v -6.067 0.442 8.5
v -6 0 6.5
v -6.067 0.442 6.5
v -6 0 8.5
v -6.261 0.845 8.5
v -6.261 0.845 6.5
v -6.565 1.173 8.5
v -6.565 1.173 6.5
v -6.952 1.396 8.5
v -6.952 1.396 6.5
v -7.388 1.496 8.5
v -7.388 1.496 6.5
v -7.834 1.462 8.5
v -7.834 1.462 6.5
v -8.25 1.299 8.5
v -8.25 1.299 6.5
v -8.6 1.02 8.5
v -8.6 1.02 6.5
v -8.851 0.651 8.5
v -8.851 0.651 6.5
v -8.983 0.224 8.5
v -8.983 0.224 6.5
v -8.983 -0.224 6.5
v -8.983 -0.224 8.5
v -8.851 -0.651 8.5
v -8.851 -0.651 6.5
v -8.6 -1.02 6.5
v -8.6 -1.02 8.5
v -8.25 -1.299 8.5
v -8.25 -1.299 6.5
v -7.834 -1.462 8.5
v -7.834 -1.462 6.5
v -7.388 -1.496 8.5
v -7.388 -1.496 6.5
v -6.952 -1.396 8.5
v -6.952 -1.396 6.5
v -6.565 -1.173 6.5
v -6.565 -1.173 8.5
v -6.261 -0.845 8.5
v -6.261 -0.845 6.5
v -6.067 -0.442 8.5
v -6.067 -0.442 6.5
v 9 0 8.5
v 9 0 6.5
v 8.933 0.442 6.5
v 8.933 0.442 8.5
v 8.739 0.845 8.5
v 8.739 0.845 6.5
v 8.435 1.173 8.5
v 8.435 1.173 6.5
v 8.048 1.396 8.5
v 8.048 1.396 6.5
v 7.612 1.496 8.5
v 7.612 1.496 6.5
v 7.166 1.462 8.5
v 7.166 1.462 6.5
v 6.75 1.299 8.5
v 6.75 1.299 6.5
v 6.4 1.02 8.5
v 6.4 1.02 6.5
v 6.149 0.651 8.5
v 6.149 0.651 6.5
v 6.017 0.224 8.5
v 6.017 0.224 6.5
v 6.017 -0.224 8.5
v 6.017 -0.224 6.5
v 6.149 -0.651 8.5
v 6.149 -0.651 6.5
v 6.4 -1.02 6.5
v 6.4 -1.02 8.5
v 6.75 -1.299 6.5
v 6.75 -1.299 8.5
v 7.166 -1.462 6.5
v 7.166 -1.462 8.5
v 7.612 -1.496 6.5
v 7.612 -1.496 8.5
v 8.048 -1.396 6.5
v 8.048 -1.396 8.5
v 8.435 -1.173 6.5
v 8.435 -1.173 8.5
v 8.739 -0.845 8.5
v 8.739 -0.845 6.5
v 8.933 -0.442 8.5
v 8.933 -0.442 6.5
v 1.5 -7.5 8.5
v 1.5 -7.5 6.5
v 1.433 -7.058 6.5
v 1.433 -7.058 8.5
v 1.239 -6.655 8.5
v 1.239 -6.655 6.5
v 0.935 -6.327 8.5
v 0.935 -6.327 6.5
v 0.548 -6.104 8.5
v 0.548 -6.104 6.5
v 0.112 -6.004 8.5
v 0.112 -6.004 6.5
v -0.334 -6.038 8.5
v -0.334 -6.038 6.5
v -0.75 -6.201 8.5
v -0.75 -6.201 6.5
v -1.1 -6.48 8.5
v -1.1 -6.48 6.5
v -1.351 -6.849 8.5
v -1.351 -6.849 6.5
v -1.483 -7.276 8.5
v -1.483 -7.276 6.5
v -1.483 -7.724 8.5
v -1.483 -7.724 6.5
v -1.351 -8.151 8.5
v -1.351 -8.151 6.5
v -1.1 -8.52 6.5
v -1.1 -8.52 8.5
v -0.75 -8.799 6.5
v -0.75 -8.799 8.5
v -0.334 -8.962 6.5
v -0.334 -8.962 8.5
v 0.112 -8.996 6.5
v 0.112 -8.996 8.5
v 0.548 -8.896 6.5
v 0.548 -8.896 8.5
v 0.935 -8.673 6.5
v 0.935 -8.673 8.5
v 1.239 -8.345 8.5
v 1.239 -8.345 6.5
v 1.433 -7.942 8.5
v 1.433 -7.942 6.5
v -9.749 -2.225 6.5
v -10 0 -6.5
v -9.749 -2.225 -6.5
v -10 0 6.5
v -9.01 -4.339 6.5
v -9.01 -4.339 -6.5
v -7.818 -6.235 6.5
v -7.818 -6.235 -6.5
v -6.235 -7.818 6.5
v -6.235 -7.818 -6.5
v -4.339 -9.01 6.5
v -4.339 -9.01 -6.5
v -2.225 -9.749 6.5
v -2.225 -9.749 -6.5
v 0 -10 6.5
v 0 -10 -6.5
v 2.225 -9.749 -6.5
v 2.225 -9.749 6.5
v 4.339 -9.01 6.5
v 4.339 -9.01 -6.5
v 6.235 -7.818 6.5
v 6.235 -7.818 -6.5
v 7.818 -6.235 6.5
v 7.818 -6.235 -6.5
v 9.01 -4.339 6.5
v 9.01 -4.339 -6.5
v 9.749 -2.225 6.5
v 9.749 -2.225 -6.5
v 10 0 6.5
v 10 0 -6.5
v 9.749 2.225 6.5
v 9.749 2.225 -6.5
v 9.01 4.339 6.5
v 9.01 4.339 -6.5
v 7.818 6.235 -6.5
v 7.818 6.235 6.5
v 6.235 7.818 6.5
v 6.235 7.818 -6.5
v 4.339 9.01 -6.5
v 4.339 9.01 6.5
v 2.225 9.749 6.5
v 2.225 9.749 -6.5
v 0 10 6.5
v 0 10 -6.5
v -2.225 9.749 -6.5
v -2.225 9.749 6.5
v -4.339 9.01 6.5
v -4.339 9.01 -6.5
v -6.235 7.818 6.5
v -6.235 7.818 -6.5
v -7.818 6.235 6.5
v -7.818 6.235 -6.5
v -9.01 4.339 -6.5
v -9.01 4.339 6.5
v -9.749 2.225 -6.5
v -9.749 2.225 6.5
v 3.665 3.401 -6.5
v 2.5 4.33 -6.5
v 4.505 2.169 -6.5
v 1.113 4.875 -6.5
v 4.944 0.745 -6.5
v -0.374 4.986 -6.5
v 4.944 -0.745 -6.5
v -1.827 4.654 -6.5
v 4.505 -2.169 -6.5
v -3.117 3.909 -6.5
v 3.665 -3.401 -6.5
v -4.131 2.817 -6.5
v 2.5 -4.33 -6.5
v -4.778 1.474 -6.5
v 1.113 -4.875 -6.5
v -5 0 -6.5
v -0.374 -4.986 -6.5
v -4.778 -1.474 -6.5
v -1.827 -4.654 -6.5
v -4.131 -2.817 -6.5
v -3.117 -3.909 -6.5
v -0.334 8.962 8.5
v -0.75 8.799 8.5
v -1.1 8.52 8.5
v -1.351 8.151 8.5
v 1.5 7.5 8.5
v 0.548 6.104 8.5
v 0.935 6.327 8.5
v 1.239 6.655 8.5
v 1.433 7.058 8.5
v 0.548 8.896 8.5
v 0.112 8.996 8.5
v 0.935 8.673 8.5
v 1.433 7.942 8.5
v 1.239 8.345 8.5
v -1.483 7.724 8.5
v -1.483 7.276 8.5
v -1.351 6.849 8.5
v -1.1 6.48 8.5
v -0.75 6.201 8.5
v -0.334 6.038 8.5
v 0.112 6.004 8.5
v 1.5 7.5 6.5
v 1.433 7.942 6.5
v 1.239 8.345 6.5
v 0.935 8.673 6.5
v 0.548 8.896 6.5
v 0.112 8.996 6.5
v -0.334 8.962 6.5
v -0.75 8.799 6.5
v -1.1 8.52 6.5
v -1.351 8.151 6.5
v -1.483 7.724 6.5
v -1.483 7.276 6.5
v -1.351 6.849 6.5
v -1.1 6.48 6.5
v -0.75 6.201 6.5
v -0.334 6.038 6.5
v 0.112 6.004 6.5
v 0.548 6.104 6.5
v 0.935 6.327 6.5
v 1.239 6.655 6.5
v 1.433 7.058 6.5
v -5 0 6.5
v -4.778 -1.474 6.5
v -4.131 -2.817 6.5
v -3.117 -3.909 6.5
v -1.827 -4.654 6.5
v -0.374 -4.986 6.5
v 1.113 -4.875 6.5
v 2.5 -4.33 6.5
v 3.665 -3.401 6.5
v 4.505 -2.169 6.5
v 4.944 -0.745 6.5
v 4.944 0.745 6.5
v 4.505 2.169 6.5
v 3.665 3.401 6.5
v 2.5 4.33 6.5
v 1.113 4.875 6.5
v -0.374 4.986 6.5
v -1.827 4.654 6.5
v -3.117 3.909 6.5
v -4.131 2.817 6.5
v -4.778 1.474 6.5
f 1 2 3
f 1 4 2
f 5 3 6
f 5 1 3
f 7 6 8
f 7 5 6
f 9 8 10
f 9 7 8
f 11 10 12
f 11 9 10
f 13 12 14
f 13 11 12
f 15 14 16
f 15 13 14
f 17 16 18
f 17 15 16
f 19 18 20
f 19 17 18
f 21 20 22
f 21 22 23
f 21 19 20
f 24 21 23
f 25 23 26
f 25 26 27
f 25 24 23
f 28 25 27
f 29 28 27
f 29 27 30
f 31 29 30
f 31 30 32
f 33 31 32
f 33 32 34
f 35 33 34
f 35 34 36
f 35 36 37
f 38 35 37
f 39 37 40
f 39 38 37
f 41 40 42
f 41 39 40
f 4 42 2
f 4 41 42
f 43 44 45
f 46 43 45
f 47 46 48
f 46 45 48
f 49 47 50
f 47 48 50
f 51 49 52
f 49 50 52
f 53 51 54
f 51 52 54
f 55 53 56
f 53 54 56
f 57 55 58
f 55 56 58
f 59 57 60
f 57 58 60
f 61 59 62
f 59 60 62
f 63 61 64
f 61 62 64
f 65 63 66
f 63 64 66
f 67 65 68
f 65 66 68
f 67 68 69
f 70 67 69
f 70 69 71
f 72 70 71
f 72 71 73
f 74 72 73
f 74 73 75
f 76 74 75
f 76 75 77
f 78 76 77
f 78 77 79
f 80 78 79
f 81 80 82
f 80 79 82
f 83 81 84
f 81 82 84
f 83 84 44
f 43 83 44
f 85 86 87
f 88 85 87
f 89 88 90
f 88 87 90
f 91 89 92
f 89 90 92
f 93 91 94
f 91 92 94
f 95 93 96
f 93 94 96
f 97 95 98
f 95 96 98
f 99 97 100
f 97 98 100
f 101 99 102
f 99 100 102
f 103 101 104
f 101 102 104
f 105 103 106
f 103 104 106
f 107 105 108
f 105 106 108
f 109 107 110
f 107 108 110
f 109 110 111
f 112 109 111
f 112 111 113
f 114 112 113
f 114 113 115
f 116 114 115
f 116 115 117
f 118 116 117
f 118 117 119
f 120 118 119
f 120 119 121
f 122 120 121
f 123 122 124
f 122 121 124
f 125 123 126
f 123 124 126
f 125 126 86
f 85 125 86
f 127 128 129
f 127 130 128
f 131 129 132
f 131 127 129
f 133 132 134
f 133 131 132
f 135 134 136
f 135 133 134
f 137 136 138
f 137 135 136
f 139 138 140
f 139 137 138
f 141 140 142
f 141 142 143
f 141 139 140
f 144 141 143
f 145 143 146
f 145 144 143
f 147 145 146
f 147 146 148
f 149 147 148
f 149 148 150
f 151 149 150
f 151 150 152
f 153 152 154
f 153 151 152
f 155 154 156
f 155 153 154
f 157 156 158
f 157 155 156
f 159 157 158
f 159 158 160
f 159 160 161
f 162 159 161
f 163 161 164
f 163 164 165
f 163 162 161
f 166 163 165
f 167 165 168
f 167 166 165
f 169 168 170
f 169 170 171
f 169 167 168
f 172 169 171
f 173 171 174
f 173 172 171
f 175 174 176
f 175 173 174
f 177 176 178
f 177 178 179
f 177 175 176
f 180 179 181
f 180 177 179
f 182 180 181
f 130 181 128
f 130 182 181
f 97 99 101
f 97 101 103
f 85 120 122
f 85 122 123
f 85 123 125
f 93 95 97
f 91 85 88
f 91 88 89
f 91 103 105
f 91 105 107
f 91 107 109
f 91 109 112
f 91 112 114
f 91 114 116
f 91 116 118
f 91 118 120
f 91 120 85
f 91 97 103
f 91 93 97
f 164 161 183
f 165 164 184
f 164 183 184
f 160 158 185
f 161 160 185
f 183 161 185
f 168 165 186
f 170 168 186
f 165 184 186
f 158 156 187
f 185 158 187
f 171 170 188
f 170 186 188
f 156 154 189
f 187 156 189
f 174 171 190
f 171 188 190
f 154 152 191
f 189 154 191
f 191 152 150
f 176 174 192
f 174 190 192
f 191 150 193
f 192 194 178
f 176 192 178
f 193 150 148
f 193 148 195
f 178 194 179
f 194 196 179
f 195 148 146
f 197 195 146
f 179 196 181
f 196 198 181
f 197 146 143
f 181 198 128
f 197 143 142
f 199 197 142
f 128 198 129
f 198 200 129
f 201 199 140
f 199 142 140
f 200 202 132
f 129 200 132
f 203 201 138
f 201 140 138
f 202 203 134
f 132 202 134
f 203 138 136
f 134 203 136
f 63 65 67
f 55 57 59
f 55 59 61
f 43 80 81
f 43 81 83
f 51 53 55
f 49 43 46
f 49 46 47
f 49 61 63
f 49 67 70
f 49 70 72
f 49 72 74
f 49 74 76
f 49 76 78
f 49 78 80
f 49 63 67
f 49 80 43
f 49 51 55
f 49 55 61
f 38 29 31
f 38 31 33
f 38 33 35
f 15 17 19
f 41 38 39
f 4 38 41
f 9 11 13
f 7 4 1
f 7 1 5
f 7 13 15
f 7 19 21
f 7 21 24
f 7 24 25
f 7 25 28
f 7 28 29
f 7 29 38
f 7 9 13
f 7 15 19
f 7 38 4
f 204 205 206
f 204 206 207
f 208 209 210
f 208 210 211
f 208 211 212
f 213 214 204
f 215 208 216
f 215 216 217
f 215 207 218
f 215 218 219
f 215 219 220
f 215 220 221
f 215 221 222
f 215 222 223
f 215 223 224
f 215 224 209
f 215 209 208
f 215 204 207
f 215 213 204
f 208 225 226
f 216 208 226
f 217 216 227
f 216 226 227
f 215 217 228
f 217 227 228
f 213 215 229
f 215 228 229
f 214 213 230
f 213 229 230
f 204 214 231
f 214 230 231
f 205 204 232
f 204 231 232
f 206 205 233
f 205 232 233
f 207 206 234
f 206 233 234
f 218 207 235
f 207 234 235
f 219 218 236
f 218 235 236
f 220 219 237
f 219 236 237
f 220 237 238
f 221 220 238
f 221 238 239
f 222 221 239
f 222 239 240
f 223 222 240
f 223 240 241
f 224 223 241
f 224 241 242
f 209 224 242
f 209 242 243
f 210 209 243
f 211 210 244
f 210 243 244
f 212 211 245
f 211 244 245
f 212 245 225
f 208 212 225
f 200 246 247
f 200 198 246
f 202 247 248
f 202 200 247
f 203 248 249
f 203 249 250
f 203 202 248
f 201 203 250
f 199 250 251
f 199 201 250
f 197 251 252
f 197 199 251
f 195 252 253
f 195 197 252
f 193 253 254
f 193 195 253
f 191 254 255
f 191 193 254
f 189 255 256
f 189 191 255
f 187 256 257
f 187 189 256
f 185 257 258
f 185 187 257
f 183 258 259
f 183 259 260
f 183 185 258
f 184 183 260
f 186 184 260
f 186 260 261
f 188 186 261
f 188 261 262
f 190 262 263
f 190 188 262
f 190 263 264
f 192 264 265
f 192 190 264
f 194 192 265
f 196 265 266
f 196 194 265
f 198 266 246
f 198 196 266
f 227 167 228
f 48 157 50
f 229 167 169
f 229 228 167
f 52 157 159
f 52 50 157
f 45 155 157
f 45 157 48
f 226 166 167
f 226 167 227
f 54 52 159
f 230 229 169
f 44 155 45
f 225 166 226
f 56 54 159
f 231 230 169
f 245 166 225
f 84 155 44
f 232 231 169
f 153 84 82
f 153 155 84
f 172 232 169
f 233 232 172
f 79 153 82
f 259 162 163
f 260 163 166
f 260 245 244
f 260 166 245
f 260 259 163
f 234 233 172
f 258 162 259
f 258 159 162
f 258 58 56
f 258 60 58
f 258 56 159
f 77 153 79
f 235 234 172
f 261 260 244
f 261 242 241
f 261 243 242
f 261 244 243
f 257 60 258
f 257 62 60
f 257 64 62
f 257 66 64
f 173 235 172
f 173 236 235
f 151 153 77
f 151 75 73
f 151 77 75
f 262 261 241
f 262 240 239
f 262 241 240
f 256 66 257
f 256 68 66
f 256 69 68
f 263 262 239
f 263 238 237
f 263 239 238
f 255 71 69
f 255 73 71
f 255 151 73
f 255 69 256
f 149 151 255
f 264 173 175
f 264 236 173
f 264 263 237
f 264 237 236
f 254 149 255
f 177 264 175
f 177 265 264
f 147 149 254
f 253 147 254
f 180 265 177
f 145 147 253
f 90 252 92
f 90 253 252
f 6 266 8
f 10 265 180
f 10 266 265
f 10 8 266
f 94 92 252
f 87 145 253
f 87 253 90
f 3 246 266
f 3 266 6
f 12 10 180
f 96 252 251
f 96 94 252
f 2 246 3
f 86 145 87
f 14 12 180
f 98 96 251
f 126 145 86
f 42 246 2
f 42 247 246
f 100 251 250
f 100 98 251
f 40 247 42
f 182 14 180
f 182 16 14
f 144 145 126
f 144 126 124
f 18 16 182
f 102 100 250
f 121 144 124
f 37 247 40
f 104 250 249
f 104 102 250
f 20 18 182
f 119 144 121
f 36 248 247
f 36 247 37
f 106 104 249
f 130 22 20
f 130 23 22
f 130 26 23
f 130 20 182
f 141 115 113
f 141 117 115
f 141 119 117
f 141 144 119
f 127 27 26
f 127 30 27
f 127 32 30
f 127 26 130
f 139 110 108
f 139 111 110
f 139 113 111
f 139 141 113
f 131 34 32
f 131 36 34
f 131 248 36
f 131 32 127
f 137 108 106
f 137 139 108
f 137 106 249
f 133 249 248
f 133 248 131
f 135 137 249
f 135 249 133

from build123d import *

# Parameters (mm, degrees)
SKETCH_1_R      = 10
SKETCH_1_R_2    = 5
EXTRUDE_1_DEPTH = 6.5
SKETCH_2_R      = 1.5
EXTRUDE_2_DEPTH = 2


with BuildPart() as part:
    # 草图1 → 凸台-拉伸1 (new, symmetric)
    with BuildSketch(Plane.XY):
        with Locations(Location((0, 0, 0), (0, 0, 180))):
            Circle(SKETCH_1_R)
        with Locations(Location((0, 0, 0), (0, 0, 180))):
            Circle(SKETCH_1_R_2, mode=Mode.SUBTRACT)
    extrude(amount=EXTRUDE_1_DEPTH, both=True)

    # 草图2 → 凸台-拉伸2 (add, symmetric)
    with BuildSketch(Plane.XY.offset(6.5)):
        with Locations((0, 7.5)):
            Circle(SKETCH_2_R)
        with Locations((7.5, 0)):
            Circle(SKETCH_2_R)
        with Locations((0, -7.5)):
            Circle(SKETCH_2_R)
        with Locations((-7.5, 0)):
            Circle(SKETCH_2_R)
    extrude(amount=EXTRUDE_2_DEPTH, both=True)


solid = part.part
